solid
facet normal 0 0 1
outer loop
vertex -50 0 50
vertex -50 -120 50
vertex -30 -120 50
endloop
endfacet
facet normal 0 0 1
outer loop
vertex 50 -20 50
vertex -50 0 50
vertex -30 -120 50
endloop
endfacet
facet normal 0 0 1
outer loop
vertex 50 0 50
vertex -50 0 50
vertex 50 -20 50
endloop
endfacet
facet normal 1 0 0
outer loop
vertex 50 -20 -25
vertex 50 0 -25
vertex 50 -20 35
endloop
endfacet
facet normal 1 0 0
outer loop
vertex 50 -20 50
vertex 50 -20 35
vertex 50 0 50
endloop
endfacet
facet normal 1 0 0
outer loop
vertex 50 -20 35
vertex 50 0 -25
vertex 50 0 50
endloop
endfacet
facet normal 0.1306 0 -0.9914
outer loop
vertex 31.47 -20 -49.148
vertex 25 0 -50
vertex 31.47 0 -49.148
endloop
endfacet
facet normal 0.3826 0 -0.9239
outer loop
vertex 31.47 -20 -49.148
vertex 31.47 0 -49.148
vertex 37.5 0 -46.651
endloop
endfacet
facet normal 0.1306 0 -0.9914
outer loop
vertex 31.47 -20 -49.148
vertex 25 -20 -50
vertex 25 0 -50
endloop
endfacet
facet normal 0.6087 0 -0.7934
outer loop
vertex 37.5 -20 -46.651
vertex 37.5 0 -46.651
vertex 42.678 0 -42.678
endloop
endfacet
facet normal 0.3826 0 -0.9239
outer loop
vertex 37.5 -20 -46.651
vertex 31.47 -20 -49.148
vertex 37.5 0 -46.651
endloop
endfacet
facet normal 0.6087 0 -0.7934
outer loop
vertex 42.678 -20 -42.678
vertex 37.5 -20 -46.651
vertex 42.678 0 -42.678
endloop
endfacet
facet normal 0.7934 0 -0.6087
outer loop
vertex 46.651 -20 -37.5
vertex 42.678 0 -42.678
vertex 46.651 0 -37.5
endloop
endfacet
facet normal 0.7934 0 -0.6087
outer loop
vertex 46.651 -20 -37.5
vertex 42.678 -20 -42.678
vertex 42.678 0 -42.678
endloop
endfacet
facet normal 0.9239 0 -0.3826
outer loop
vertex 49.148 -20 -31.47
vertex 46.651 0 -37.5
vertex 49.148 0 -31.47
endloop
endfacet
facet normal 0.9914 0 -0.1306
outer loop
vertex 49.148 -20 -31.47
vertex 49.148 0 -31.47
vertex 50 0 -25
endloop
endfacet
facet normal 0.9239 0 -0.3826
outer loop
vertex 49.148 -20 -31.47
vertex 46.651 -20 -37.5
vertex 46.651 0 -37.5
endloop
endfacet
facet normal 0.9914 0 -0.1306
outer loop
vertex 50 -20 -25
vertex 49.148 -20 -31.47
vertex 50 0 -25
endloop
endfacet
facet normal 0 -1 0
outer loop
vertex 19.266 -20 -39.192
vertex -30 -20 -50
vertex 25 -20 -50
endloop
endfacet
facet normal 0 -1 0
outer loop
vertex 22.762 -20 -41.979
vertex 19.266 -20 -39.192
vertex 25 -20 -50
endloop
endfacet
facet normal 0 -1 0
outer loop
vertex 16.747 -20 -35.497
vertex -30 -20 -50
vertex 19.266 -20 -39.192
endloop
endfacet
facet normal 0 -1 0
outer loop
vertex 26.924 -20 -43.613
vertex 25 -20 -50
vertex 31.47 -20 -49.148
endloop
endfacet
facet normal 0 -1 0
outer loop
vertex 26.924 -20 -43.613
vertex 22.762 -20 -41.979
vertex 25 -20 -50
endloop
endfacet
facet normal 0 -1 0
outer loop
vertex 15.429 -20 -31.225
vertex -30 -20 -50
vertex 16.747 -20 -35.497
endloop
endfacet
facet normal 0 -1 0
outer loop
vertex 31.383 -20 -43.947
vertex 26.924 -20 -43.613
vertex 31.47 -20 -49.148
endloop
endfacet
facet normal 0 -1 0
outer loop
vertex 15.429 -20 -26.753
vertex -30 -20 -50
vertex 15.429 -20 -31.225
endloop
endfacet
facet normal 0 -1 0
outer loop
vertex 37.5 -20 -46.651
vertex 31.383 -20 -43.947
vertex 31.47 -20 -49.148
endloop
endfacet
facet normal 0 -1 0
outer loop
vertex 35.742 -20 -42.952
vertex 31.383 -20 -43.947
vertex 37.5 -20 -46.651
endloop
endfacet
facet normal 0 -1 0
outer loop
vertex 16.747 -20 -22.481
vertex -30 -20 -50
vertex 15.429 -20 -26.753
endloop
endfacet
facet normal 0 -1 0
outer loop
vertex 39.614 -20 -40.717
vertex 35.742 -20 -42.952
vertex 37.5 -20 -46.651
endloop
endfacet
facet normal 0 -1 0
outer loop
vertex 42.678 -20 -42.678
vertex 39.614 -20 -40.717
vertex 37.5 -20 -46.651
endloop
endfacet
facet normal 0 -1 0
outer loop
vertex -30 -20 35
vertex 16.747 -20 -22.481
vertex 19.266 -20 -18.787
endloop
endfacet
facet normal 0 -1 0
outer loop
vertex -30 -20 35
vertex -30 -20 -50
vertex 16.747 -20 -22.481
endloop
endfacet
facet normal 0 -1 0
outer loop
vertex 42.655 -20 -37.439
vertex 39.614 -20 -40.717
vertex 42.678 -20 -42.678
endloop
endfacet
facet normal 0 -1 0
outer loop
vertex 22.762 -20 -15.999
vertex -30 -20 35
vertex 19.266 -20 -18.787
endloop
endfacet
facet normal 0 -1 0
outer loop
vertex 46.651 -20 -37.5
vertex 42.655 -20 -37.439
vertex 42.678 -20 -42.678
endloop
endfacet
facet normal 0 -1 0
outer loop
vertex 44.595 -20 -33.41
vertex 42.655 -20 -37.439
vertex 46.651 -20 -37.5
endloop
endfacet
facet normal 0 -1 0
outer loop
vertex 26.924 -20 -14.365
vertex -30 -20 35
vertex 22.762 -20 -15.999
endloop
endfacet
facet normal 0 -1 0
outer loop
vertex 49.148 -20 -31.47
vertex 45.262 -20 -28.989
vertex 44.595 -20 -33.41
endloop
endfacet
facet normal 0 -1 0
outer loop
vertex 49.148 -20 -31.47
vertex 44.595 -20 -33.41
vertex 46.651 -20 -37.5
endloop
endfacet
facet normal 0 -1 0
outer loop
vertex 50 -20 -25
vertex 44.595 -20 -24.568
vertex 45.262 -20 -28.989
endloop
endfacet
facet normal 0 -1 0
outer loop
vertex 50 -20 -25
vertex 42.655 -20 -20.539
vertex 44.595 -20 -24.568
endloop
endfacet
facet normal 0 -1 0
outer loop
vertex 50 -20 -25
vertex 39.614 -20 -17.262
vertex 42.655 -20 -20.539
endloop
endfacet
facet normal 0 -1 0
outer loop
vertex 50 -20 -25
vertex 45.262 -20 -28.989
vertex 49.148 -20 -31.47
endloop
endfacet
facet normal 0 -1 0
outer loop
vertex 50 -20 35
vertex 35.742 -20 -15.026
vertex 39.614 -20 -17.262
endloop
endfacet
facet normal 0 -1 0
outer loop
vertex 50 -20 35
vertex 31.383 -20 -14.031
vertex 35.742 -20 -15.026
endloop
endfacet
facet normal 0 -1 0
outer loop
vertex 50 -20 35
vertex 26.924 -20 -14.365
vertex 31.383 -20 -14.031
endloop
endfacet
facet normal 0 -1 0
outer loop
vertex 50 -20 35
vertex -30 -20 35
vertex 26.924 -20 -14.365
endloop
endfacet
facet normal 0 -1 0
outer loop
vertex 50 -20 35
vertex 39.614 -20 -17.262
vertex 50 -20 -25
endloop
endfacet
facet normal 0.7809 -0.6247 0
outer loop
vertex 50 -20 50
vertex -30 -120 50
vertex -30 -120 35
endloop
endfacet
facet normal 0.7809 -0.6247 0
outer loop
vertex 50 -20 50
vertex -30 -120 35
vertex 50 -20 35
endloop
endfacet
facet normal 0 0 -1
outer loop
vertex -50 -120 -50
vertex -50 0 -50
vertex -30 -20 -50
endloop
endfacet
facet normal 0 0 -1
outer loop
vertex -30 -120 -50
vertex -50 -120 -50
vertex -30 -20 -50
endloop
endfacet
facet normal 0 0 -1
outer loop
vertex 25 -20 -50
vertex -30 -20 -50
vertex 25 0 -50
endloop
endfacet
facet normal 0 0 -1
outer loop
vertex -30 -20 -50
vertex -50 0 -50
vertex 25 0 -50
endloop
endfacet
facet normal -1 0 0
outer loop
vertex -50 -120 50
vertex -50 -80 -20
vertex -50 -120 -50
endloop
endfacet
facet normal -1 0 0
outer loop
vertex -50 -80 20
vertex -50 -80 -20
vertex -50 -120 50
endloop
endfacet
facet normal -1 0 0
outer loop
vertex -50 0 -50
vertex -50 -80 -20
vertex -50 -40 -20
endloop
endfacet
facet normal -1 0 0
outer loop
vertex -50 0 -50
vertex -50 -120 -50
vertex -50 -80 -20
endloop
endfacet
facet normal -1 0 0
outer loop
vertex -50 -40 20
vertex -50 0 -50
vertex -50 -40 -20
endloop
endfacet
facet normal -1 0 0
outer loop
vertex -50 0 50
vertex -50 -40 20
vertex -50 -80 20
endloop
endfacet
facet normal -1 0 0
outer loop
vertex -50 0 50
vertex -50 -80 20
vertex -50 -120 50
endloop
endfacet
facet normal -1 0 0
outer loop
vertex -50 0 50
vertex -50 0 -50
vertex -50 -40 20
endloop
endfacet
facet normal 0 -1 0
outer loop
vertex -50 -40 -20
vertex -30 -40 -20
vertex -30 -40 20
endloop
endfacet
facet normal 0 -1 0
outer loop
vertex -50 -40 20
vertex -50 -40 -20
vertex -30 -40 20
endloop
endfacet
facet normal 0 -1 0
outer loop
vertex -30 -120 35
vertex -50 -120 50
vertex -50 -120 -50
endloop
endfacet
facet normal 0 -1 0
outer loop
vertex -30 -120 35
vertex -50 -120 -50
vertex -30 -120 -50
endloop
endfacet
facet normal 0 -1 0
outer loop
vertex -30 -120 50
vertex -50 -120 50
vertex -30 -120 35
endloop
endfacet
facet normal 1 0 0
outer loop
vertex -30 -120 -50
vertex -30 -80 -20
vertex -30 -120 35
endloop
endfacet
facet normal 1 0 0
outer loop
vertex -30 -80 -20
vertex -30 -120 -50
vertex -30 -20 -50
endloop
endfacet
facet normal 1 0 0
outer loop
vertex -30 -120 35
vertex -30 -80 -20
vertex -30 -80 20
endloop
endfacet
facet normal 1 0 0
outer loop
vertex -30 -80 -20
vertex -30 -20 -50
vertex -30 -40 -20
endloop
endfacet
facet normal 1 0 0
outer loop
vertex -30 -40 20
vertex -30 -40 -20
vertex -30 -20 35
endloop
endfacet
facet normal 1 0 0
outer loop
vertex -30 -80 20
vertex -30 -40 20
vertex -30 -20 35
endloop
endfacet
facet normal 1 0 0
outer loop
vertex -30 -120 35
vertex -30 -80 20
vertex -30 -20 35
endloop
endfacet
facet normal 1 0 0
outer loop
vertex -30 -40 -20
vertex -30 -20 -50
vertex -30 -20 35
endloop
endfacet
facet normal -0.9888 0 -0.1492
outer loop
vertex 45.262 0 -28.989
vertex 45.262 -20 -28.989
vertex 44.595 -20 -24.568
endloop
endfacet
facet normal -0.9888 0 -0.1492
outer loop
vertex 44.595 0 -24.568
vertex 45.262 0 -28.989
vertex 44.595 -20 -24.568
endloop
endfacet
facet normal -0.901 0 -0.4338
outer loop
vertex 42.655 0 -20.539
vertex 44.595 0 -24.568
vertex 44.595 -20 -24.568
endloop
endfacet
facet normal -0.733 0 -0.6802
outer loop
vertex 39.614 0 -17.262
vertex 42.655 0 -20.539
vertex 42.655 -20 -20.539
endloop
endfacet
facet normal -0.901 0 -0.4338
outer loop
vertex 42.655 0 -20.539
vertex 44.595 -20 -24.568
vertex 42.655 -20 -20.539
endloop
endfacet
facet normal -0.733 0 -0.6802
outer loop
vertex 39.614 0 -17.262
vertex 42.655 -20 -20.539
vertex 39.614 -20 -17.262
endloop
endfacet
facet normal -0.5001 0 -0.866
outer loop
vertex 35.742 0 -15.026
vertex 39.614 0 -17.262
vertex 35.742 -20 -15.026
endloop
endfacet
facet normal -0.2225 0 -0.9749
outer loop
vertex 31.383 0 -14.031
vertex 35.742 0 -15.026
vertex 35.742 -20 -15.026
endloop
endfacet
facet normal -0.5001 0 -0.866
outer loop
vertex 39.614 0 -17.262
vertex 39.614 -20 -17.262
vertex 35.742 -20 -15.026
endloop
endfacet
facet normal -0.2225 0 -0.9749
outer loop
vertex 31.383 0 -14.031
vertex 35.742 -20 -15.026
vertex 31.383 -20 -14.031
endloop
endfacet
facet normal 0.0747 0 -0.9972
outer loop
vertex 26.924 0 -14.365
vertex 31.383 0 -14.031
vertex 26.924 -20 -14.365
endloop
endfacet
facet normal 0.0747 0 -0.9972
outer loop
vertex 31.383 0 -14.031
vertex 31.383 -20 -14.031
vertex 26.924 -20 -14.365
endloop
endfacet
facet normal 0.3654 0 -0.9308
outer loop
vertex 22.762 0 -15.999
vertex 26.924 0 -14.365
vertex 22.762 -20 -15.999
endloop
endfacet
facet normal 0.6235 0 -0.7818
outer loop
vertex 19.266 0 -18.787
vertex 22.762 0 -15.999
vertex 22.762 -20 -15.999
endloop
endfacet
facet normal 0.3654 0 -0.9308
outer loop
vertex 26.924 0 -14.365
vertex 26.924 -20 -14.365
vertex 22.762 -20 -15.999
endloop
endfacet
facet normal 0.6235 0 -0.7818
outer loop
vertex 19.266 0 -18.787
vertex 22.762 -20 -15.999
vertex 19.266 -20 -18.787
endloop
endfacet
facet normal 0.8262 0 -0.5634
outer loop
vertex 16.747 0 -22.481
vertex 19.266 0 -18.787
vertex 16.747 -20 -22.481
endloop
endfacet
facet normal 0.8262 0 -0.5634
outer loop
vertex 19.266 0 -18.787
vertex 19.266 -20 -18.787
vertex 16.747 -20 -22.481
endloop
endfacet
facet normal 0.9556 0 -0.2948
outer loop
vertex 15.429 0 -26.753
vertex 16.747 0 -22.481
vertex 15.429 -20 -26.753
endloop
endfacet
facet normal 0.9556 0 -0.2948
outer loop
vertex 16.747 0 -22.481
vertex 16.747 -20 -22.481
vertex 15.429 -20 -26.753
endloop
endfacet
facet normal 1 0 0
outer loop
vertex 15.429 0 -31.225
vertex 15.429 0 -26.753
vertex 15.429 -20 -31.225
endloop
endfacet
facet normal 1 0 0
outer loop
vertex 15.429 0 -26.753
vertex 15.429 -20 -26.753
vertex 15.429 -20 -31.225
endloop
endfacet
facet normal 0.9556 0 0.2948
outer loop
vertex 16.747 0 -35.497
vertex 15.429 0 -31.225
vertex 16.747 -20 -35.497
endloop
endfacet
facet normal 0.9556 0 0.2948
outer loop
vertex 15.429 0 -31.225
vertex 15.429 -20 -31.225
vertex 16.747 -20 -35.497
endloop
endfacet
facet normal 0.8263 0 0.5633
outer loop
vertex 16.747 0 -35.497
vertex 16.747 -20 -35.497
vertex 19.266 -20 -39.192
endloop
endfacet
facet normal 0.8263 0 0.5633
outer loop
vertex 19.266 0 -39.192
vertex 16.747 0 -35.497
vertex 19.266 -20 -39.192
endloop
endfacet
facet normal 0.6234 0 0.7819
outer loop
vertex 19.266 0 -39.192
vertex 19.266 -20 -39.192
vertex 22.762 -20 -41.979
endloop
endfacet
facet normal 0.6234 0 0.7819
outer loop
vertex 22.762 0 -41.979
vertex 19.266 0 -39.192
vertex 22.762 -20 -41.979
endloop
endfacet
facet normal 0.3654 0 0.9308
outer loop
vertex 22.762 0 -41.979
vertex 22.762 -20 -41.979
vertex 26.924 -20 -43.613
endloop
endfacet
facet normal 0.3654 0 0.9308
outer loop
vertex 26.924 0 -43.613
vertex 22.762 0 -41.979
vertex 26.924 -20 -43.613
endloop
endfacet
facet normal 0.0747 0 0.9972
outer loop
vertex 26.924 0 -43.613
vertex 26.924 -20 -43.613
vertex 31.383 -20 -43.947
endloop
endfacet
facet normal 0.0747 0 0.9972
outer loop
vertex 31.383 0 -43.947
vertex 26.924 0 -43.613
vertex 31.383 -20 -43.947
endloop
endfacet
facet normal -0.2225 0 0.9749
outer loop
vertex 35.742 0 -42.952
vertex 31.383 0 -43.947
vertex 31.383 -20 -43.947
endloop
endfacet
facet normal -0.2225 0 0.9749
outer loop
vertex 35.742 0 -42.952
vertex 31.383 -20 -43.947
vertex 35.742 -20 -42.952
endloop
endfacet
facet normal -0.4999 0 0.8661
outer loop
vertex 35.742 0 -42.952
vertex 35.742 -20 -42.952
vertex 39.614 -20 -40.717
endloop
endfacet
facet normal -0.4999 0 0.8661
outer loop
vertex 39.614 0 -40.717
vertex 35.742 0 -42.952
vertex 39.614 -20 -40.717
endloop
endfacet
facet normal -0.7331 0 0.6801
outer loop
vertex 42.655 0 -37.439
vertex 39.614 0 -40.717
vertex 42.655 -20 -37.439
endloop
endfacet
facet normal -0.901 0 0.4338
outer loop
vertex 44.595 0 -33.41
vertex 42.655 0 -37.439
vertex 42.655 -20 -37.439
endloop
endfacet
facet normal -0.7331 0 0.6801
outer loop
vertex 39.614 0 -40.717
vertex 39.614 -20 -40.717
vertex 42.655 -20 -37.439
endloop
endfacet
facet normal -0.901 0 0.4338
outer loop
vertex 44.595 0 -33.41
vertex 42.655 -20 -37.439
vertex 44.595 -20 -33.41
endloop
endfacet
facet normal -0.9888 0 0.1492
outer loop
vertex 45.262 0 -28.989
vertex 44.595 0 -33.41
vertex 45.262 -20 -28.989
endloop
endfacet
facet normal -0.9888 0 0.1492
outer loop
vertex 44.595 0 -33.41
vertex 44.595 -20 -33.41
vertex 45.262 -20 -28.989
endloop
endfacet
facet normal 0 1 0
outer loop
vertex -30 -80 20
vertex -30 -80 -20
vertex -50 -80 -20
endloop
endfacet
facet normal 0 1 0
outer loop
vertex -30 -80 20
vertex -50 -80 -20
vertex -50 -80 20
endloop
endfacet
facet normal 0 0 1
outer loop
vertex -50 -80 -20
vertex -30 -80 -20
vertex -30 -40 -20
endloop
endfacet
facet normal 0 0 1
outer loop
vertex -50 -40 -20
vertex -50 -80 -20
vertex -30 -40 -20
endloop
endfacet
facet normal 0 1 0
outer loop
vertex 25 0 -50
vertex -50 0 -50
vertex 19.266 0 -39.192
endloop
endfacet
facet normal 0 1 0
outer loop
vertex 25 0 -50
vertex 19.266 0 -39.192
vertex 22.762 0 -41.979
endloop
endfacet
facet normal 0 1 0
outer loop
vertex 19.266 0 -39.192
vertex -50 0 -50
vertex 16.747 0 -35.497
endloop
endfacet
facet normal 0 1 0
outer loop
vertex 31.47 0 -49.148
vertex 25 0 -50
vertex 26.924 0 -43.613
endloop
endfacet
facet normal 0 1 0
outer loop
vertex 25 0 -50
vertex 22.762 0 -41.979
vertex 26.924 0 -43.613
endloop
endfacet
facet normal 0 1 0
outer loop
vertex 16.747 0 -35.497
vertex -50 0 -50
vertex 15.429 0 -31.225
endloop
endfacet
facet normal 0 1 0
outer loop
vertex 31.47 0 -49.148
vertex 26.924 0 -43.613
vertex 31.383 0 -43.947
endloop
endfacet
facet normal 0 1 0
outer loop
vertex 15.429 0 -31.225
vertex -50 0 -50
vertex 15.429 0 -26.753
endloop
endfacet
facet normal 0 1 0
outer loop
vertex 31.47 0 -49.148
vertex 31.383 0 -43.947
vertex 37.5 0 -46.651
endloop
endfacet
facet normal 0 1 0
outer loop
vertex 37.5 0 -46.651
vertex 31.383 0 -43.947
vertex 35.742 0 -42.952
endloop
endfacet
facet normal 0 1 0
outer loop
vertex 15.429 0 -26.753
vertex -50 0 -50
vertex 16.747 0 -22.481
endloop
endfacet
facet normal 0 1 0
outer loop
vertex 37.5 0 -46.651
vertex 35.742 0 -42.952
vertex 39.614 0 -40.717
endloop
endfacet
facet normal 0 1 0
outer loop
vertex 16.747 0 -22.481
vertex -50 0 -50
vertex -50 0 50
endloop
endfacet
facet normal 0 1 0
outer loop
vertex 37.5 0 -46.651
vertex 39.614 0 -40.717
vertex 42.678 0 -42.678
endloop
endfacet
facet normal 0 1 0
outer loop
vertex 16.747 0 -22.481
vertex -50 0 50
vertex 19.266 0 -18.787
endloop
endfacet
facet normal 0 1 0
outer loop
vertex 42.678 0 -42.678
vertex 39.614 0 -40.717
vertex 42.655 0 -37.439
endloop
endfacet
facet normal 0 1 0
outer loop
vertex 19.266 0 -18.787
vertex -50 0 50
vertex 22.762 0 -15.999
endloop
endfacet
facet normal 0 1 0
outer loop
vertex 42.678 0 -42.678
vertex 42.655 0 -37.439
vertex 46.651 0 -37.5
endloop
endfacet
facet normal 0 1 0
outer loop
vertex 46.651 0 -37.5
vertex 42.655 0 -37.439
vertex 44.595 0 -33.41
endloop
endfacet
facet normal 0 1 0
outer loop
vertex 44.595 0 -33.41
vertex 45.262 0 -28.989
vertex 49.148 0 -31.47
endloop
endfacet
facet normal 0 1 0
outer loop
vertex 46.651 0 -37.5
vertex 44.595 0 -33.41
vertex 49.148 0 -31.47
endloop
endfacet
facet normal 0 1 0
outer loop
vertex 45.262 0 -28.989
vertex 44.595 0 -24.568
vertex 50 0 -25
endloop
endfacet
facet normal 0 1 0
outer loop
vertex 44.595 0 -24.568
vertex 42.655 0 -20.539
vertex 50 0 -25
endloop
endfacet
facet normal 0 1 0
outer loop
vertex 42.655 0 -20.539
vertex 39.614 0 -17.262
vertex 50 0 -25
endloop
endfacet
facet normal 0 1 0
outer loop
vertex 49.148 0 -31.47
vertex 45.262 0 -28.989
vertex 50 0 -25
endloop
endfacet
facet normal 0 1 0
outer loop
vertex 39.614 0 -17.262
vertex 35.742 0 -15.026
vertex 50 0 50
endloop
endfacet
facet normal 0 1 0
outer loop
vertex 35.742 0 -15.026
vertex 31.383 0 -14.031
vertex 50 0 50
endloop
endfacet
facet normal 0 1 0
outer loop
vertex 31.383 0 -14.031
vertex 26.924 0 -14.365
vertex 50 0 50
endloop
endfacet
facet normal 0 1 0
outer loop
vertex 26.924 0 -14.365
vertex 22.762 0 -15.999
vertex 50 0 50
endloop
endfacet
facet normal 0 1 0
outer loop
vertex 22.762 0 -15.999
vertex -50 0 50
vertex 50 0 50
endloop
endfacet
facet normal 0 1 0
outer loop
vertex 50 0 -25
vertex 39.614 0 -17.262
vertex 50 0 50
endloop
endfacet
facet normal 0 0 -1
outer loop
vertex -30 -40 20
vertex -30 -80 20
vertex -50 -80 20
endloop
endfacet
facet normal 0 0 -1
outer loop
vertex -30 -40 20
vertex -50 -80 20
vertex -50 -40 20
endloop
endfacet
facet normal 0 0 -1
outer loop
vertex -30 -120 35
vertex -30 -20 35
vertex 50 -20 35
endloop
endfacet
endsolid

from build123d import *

# Parameters (mm, degrees)
F0_W      = 100
F0_H      = 100
F1_DEPTH  = 20
F2_R      = 15
F3_DEPTH  = 20
F4_W      = 20
F4_H      = 100
F5_DEPTH  = 100
F6_R      = 25
F7_W      = 40
F7_H      = 40
F8_DEPTH  = 20
F10_DEPTH = 15


with BuildPart() as f1:
    # F0 (on Front) → F1 (new body)
    with BuildSketch(Plane.XZ):
        Rectangle(F0_W, F0_H)
    extrude(amount=F1_DEPTH)

    # F2 (on face) → F3 (cut)
    with BuildSketch(Plane.XZ.offset(20)):
        with Locations((30.261763, -28.989102)):
            Circle(F2_R)
    extrude(amount=-F3_DEPTH, mode=Mode.SUBTRACT)

    # F4 (on face) → F5 (join)
    with BuildSketch(Plane.XZ.offset(20)):
        with Locations((-40, 0)):
            Rectangle(F4_W, F4_H)
    extrude(amount=F5_DEPTH)

    # F6
    f6_edges = [f1.edges().sort_by_distance(p)[0] for p in [
        (50, -10, -50),
    ]]
    fillet(f6_edges, radius=F6_R)

    # F7 (on face) → F8 (cut)
    with BuildSketch(Plane.YZ.offset(-30)):
        with Locations((-60, 0)):
            Rectangle(F7_W, F7_H)
    extrude(amount=-F8_DEPTH, mode=Mode.SUBTRACT)

    # F9 (on face) → F10 (join)
    with BuildSketch(Plane.XY.offset(50)):
        Polygon((-30, -20), (-30, -120), (50, -20), align=None)
    extrude(amount=-F10_DEPTH)


solid = f1.part
